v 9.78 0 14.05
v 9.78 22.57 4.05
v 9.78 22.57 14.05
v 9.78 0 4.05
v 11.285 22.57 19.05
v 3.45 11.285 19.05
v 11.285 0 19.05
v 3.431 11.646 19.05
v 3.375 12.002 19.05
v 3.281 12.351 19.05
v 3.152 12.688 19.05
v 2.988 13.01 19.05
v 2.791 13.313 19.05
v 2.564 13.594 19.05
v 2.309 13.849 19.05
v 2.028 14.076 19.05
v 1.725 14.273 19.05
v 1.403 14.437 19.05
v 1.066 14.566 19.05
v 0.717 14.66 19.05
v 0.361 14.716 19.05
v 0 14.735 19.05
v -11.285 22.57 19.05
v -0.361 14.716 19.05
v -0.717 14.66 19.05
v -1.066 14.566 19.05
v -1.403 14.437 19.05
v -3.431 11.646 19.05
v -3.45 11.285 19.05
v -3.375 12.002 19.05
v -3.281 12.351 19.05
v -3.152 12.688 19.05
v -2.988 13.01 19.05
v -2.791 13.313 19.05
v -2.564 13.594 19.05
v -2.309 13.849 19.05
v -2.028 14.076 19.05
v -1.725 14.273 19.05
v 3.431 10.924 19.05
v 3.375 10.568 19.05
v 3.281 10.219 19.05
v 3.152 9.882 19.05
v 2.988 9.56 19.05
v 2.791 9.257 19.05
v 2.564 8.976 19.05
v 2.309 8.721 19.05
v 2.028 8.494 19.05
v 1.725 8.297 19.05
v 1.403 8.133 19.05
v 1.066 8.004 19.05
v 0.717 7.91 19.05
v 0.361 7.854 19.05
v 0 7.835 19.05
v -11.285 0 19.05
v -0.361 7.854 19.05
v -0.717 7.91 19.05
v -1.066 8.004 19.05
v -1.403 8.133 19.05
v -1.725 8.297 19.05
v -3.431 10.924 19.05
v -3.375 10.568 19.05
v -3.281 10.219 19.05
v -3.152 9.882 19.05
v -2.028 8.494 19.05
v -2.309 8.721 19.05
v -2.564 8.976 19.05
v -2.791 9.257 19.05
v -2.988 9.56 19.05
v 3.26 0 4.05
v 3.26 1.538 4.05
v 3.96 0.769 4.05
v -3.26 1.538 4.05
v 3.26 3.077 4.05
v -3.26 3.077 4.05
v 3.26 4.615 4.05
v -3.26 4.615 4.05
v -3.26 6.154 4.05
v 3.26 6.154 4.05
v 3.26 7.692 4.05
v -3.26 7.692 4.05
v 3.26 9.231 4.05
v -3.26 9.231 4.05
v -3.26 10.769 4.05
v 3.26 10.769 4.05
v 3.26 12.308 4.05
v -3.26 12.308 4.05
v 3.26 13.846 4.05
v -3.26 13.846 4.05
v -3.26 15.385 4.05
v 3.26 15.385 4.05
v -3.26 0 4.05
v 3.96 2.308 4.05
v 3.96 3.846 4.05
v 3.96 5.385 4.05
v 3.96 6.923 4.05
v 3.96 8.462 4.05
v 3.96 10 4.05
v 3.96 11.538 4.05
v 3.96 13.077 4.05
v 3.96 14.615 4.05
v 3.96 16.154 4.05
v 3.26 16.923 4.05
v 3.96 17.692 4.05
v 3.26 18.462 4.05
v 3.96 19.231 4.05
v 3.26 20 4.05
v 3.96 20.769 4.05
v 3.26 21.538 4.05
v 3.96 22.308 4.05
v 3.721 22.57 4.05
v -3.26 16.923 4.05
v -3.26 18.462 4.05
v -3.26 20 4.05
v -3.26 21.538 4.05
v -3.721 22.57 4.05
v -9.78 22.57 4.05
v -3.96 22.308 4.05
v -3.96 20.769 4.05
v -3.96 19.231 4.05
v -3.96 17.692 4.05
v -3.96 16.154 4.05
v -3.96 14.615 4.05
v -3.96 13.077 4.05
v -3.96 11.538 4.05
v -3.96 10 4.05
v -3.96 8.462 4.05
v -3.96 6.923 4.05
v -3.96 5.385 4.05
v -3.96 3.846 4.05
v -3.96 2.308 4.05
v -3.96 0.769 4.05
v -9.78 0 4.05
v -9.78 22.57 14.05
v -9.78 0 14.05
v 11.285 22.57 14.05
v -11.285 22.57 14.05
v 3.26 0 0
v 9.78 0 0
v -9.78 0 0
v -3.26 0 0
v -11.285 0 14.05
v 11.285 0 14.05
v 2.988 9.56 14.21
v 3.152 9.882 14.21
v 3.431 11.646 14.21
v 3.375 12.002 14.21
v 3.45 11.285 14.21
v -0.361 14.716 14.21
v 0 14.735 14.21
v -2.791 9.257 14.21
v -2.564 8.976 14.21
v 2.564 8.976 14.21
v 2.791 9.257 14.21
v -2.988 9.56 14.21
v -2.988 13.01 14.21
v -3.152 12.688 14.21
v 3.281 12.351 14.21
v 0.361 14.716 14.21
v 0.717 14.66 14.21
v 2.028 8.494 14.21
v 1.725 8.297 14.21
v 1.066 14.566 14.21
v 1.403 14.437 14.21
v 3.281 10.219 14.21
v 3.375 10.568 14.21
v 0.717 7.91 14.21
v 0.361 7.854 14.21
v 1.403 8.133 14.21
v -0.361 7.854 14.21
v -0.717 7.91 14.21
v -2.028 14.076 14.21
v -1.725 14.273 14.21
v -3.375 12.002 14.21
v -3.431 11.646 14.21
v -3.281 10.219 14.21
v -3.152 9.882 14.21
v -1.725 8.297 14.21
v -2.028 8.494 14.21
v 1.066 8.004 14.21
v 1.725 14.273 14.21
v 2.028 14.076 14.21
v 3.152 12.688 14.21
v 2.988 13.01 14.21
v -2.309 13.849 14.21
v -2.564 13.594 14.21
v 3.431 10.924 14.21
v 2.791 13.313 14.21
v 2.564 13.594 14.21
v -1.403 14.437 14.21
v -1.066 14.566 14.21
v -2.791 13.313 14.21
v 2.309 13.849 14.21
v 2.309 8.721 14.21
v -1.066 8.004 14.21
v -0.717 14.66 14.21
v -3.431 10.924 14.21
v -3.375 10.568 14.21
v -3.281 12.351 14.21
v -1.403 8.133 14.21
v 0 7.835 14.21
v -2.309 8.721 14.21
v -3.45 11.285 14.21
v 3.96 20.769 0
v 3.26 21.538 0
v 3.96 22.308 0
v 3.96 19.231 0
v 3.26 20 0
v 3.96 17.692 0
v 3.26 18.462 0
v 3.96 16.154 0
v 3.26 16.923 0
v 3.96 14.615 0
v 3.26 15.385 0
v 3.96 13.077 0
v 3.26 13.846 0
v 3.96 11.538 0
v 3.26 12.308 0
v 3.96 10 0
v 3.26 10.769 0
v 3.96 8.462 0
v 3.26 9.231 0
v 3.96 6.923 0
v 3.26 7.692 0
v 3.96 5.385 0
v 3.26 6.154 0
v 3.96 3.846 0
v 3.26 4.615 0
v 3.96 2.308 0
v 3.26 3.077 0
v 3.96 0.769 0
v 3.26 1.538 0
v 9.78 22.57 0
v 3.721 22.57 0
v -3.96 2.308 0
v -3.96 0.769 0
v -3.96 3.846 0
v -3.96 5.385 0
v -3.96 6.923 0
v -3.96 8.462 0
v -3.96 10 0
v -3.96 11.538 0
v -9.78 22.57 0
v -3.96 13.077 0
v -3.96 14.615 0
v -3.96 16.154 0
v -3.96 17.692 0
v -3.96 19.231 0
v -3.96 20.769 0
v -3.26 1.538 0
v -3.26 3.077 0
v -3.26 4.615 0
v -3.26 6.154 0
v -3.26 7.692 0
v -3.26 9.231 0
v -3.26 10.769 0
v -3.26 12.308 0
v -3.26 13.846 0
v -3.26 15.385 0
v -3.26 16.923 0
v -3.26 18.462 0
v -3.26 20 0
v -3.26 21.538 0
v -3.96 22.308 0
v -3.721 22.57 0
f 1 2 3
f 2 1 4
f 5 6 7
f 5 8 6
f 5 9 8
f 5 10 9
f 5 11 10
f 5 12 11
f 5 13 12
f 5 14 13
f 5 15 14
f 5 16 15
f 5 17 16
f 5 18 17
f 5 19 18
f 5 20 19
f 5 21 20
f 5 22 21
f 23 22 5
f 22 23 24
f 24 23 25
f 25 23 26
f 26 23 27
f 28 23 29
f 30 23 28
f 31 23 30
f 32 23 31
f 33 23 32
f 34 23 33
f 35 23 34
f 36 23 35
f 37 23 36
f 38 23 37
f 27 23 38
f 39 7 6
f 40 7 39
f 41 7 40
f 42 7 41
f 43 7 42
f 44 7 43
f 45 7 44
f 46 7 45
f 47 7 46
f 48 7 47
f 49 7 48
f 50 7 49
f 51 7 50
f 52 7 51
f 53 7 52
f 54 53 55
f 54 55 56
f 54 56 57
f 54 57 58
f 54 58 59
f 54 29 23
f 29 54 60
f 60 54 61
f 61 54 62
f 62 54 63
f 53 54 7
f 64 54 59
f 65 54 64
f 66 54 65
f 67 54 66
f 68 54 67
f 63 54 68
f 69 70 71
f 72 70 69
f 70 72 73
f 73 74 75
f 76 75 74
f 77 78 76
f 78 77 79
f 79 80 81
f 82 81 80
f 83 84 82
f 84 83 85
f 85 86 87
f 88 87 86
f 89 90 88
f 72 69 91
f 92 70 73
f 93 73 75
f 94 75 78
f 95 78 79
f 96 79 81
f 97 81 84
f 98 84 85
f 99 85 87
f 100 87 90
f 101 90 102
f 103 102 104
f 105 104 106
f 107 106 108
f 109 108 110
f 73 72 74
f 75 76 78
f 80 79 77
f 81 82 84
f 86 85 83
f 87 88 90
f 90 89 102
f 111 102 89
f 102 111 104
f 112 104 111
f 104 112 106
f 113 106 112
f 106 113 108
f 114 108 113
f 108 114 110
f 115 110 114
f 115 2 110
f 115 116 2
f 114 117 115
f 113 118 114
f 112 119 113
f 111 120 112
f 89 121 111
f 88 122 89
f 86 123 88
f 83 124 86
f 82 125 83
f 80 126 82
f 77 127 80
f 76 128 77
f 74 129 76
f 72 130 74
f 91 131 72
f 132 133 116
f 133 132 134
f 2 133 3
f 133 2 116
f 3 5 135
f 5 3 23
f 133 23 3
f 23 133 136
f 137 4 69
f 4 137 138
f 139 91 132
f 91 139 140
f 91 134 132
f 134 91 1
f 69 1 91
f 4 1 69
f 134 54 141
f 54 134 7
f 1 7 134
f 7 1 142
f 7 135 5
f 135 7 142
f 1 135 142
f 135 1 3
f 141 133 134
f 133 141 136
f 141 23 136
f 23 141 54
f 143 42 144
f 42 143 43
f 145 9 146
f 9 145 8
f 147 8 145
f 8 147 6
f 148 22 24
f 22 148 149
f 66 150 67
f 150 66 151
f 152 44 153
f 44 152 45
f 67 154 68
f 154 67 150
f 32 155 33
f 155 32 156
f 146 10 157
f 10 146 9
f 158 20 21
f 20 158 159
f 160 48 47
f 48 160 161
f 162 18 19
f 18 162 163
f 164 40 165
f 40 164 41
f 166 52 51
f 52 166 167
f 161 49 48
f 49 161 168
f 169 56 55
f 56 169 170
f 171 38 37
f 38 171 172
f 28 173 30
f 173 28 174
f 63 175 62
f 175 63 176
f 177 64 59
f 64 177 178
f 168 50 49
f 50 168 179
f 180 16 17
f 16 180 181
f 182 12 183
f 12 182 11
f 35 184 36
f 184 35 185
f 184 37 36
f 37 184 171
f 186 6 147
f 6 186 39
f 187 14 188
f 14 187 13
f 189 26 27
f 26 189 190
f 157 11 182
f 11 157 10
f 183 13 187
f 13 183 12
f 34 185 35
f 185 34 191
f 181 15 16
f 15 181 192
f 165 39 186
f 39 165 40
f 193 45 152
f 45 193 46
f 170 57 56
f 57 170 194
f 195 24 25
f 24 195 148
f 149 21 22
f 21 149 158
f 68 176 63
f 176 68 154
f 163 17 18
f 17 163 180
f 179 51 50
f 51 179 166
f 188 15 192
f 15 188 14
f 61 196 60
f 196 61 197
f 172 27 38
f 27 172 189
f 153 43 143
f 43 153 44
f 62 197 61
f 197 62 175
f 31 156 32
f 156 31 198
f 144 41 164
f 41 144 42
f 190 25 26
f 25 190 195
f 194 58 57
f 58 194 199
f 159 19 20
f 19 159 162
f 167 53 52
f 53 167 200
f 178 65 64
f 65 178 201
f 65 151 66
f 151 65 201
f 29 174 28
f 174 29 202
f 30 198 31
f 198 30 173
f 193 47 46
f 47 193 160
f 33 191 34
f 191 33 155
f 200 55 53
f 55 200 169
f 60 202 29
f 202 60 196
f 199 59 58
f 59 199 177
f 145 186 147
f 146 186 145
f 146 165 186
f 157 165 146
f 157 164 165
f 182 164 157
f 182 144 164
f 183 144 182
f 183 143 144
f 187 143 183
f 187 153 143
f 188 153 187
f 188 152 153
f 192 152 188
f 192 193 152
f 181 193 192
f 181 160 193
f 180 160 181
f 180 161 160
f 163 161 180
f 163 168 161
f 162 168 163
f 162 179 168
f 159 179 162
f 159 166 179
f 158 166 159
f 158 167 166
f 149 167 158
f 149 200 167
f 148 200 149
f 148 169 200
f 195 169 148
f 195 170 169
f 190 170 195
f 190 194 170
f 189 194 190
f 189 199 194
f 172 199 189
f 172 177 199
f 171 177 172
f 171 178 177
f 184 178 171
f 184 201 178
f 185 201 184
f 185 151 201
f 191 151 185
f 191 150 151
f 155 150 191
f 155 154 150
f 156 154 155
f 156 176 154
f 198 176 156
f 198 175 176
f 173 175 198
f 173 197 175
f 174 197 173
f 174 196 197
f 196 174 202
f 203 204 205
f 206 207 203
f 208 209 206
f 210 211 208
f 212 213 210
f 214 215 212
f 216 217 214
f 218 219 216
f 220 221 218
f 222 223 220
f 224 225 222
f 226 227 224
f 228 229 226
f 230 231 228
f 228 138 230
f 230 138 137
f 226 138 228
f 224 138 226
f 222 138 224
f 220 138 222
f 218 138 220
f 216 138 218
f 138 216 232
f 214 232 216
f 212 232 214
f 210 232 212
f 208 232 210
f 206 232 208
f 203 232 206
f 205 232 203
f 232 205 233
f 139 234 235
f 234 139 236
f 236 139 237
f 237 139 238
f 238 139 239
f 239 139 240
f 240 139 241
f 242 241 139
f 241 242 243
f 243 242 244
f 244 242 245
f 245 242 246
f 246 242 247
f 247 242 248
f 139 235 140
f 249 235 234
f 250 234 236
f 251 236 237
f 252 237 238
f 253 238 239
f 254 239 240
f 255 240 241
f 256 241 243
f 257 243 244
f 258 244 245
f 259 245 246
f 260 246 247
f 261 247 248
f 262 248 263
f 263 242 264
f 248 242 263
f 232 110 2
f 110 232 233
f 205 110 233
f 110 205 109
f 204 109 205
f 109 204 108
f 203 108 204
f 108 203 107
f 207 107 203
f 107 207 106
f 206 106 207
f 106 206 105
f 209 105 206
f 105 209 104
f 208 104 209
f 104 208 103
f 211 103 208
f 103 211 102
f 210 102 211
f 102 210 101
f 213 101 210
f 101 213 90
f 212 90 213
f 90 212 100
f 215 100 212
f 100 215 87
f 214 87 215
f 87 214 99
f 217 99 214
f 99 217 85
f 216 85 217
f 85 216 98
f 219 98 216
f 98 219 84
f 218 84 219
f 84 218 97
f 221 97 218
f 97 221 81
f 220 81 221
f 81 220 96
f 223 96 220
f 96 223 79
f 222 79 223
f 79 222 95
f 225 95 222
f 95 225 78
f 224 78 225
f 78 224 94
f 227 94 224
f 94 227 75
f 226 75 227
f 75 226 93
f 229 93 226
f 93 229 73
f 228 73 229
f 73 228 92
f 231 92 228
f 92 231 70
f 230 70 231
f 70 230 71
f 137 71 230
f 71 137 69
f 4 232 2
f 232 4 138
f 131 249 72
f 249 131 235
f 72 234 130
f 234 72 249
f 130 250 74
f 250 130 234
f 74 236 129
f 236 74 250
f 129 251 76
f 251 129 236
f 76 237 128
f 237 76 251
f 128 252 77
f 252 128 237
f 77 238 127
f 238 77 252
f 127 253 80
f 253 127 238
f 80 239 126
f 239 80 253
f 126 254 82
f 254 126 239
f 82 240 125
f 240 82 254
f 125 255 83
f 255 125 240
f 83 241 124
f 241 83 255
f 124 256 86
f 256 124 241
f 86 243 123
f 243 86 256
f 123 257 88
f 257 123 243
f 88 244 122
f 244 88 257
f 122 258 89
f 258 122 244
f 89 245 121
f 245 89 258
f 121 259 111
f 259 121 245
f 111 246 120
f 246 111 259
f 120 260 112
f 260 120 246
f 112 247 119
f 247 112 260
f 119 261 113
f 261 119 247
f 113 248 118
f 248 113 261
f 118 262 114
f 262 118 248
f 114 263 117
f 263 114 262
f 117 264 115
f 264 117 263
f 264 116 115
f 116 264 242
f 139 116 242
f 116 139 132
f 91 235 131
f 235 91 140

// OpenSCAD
finger_width = 6.52; // mm
space = 6.52; // mm
length = 22.57; // mm
finger_height = 4.05; // mm
tpc=6.5; // mm
tooth_depth=0.70; // mm
top_height = 15.0; //6.56; //mm
hole_diameter = 6.9; //mm
hole_depth = 4.84; // mm
platform_height = 5; //mm
$fn=60;

module finger() {
        difference() {
            square([finger_width, length]);
            for (i = [0:(10/tpc):length]) {
                translate([0, i]) {
                    polygon([
                        [0, 0],
                        [0, (10/tpc)],
                        [tooth_depth, (5/tpc)]
                    ]);
                 }
             }
        }
}

// lower with fingers
linear_extrude(finger_height) {
    translate([space / 2, 0]) {
        finger();
    }
    mirror([1,0]) {
        translate([space / 2, 0]) {
            finger();
        }
    }
}

difference() {
    union() {
        // upper
        translate([- finger_width - (space / 2), 0, finger_height]) {
            cube([
                finger_width * 2 + space, 
                length, 
                top_height
            ]);
        }
        
        // platform
        translate([
            length / -2,
            0,
            finger_height + top_height - platform_height
            ]) {
            cube([
                length, 
                length, 
                platform_height
            ]);
        }  
    }   
    
    // hole
    translate([0, length / 2, finger_height + top_height - hole_depth]) {
        cylinder(h=hole_depth, d=hole_diameter);
     }
}
